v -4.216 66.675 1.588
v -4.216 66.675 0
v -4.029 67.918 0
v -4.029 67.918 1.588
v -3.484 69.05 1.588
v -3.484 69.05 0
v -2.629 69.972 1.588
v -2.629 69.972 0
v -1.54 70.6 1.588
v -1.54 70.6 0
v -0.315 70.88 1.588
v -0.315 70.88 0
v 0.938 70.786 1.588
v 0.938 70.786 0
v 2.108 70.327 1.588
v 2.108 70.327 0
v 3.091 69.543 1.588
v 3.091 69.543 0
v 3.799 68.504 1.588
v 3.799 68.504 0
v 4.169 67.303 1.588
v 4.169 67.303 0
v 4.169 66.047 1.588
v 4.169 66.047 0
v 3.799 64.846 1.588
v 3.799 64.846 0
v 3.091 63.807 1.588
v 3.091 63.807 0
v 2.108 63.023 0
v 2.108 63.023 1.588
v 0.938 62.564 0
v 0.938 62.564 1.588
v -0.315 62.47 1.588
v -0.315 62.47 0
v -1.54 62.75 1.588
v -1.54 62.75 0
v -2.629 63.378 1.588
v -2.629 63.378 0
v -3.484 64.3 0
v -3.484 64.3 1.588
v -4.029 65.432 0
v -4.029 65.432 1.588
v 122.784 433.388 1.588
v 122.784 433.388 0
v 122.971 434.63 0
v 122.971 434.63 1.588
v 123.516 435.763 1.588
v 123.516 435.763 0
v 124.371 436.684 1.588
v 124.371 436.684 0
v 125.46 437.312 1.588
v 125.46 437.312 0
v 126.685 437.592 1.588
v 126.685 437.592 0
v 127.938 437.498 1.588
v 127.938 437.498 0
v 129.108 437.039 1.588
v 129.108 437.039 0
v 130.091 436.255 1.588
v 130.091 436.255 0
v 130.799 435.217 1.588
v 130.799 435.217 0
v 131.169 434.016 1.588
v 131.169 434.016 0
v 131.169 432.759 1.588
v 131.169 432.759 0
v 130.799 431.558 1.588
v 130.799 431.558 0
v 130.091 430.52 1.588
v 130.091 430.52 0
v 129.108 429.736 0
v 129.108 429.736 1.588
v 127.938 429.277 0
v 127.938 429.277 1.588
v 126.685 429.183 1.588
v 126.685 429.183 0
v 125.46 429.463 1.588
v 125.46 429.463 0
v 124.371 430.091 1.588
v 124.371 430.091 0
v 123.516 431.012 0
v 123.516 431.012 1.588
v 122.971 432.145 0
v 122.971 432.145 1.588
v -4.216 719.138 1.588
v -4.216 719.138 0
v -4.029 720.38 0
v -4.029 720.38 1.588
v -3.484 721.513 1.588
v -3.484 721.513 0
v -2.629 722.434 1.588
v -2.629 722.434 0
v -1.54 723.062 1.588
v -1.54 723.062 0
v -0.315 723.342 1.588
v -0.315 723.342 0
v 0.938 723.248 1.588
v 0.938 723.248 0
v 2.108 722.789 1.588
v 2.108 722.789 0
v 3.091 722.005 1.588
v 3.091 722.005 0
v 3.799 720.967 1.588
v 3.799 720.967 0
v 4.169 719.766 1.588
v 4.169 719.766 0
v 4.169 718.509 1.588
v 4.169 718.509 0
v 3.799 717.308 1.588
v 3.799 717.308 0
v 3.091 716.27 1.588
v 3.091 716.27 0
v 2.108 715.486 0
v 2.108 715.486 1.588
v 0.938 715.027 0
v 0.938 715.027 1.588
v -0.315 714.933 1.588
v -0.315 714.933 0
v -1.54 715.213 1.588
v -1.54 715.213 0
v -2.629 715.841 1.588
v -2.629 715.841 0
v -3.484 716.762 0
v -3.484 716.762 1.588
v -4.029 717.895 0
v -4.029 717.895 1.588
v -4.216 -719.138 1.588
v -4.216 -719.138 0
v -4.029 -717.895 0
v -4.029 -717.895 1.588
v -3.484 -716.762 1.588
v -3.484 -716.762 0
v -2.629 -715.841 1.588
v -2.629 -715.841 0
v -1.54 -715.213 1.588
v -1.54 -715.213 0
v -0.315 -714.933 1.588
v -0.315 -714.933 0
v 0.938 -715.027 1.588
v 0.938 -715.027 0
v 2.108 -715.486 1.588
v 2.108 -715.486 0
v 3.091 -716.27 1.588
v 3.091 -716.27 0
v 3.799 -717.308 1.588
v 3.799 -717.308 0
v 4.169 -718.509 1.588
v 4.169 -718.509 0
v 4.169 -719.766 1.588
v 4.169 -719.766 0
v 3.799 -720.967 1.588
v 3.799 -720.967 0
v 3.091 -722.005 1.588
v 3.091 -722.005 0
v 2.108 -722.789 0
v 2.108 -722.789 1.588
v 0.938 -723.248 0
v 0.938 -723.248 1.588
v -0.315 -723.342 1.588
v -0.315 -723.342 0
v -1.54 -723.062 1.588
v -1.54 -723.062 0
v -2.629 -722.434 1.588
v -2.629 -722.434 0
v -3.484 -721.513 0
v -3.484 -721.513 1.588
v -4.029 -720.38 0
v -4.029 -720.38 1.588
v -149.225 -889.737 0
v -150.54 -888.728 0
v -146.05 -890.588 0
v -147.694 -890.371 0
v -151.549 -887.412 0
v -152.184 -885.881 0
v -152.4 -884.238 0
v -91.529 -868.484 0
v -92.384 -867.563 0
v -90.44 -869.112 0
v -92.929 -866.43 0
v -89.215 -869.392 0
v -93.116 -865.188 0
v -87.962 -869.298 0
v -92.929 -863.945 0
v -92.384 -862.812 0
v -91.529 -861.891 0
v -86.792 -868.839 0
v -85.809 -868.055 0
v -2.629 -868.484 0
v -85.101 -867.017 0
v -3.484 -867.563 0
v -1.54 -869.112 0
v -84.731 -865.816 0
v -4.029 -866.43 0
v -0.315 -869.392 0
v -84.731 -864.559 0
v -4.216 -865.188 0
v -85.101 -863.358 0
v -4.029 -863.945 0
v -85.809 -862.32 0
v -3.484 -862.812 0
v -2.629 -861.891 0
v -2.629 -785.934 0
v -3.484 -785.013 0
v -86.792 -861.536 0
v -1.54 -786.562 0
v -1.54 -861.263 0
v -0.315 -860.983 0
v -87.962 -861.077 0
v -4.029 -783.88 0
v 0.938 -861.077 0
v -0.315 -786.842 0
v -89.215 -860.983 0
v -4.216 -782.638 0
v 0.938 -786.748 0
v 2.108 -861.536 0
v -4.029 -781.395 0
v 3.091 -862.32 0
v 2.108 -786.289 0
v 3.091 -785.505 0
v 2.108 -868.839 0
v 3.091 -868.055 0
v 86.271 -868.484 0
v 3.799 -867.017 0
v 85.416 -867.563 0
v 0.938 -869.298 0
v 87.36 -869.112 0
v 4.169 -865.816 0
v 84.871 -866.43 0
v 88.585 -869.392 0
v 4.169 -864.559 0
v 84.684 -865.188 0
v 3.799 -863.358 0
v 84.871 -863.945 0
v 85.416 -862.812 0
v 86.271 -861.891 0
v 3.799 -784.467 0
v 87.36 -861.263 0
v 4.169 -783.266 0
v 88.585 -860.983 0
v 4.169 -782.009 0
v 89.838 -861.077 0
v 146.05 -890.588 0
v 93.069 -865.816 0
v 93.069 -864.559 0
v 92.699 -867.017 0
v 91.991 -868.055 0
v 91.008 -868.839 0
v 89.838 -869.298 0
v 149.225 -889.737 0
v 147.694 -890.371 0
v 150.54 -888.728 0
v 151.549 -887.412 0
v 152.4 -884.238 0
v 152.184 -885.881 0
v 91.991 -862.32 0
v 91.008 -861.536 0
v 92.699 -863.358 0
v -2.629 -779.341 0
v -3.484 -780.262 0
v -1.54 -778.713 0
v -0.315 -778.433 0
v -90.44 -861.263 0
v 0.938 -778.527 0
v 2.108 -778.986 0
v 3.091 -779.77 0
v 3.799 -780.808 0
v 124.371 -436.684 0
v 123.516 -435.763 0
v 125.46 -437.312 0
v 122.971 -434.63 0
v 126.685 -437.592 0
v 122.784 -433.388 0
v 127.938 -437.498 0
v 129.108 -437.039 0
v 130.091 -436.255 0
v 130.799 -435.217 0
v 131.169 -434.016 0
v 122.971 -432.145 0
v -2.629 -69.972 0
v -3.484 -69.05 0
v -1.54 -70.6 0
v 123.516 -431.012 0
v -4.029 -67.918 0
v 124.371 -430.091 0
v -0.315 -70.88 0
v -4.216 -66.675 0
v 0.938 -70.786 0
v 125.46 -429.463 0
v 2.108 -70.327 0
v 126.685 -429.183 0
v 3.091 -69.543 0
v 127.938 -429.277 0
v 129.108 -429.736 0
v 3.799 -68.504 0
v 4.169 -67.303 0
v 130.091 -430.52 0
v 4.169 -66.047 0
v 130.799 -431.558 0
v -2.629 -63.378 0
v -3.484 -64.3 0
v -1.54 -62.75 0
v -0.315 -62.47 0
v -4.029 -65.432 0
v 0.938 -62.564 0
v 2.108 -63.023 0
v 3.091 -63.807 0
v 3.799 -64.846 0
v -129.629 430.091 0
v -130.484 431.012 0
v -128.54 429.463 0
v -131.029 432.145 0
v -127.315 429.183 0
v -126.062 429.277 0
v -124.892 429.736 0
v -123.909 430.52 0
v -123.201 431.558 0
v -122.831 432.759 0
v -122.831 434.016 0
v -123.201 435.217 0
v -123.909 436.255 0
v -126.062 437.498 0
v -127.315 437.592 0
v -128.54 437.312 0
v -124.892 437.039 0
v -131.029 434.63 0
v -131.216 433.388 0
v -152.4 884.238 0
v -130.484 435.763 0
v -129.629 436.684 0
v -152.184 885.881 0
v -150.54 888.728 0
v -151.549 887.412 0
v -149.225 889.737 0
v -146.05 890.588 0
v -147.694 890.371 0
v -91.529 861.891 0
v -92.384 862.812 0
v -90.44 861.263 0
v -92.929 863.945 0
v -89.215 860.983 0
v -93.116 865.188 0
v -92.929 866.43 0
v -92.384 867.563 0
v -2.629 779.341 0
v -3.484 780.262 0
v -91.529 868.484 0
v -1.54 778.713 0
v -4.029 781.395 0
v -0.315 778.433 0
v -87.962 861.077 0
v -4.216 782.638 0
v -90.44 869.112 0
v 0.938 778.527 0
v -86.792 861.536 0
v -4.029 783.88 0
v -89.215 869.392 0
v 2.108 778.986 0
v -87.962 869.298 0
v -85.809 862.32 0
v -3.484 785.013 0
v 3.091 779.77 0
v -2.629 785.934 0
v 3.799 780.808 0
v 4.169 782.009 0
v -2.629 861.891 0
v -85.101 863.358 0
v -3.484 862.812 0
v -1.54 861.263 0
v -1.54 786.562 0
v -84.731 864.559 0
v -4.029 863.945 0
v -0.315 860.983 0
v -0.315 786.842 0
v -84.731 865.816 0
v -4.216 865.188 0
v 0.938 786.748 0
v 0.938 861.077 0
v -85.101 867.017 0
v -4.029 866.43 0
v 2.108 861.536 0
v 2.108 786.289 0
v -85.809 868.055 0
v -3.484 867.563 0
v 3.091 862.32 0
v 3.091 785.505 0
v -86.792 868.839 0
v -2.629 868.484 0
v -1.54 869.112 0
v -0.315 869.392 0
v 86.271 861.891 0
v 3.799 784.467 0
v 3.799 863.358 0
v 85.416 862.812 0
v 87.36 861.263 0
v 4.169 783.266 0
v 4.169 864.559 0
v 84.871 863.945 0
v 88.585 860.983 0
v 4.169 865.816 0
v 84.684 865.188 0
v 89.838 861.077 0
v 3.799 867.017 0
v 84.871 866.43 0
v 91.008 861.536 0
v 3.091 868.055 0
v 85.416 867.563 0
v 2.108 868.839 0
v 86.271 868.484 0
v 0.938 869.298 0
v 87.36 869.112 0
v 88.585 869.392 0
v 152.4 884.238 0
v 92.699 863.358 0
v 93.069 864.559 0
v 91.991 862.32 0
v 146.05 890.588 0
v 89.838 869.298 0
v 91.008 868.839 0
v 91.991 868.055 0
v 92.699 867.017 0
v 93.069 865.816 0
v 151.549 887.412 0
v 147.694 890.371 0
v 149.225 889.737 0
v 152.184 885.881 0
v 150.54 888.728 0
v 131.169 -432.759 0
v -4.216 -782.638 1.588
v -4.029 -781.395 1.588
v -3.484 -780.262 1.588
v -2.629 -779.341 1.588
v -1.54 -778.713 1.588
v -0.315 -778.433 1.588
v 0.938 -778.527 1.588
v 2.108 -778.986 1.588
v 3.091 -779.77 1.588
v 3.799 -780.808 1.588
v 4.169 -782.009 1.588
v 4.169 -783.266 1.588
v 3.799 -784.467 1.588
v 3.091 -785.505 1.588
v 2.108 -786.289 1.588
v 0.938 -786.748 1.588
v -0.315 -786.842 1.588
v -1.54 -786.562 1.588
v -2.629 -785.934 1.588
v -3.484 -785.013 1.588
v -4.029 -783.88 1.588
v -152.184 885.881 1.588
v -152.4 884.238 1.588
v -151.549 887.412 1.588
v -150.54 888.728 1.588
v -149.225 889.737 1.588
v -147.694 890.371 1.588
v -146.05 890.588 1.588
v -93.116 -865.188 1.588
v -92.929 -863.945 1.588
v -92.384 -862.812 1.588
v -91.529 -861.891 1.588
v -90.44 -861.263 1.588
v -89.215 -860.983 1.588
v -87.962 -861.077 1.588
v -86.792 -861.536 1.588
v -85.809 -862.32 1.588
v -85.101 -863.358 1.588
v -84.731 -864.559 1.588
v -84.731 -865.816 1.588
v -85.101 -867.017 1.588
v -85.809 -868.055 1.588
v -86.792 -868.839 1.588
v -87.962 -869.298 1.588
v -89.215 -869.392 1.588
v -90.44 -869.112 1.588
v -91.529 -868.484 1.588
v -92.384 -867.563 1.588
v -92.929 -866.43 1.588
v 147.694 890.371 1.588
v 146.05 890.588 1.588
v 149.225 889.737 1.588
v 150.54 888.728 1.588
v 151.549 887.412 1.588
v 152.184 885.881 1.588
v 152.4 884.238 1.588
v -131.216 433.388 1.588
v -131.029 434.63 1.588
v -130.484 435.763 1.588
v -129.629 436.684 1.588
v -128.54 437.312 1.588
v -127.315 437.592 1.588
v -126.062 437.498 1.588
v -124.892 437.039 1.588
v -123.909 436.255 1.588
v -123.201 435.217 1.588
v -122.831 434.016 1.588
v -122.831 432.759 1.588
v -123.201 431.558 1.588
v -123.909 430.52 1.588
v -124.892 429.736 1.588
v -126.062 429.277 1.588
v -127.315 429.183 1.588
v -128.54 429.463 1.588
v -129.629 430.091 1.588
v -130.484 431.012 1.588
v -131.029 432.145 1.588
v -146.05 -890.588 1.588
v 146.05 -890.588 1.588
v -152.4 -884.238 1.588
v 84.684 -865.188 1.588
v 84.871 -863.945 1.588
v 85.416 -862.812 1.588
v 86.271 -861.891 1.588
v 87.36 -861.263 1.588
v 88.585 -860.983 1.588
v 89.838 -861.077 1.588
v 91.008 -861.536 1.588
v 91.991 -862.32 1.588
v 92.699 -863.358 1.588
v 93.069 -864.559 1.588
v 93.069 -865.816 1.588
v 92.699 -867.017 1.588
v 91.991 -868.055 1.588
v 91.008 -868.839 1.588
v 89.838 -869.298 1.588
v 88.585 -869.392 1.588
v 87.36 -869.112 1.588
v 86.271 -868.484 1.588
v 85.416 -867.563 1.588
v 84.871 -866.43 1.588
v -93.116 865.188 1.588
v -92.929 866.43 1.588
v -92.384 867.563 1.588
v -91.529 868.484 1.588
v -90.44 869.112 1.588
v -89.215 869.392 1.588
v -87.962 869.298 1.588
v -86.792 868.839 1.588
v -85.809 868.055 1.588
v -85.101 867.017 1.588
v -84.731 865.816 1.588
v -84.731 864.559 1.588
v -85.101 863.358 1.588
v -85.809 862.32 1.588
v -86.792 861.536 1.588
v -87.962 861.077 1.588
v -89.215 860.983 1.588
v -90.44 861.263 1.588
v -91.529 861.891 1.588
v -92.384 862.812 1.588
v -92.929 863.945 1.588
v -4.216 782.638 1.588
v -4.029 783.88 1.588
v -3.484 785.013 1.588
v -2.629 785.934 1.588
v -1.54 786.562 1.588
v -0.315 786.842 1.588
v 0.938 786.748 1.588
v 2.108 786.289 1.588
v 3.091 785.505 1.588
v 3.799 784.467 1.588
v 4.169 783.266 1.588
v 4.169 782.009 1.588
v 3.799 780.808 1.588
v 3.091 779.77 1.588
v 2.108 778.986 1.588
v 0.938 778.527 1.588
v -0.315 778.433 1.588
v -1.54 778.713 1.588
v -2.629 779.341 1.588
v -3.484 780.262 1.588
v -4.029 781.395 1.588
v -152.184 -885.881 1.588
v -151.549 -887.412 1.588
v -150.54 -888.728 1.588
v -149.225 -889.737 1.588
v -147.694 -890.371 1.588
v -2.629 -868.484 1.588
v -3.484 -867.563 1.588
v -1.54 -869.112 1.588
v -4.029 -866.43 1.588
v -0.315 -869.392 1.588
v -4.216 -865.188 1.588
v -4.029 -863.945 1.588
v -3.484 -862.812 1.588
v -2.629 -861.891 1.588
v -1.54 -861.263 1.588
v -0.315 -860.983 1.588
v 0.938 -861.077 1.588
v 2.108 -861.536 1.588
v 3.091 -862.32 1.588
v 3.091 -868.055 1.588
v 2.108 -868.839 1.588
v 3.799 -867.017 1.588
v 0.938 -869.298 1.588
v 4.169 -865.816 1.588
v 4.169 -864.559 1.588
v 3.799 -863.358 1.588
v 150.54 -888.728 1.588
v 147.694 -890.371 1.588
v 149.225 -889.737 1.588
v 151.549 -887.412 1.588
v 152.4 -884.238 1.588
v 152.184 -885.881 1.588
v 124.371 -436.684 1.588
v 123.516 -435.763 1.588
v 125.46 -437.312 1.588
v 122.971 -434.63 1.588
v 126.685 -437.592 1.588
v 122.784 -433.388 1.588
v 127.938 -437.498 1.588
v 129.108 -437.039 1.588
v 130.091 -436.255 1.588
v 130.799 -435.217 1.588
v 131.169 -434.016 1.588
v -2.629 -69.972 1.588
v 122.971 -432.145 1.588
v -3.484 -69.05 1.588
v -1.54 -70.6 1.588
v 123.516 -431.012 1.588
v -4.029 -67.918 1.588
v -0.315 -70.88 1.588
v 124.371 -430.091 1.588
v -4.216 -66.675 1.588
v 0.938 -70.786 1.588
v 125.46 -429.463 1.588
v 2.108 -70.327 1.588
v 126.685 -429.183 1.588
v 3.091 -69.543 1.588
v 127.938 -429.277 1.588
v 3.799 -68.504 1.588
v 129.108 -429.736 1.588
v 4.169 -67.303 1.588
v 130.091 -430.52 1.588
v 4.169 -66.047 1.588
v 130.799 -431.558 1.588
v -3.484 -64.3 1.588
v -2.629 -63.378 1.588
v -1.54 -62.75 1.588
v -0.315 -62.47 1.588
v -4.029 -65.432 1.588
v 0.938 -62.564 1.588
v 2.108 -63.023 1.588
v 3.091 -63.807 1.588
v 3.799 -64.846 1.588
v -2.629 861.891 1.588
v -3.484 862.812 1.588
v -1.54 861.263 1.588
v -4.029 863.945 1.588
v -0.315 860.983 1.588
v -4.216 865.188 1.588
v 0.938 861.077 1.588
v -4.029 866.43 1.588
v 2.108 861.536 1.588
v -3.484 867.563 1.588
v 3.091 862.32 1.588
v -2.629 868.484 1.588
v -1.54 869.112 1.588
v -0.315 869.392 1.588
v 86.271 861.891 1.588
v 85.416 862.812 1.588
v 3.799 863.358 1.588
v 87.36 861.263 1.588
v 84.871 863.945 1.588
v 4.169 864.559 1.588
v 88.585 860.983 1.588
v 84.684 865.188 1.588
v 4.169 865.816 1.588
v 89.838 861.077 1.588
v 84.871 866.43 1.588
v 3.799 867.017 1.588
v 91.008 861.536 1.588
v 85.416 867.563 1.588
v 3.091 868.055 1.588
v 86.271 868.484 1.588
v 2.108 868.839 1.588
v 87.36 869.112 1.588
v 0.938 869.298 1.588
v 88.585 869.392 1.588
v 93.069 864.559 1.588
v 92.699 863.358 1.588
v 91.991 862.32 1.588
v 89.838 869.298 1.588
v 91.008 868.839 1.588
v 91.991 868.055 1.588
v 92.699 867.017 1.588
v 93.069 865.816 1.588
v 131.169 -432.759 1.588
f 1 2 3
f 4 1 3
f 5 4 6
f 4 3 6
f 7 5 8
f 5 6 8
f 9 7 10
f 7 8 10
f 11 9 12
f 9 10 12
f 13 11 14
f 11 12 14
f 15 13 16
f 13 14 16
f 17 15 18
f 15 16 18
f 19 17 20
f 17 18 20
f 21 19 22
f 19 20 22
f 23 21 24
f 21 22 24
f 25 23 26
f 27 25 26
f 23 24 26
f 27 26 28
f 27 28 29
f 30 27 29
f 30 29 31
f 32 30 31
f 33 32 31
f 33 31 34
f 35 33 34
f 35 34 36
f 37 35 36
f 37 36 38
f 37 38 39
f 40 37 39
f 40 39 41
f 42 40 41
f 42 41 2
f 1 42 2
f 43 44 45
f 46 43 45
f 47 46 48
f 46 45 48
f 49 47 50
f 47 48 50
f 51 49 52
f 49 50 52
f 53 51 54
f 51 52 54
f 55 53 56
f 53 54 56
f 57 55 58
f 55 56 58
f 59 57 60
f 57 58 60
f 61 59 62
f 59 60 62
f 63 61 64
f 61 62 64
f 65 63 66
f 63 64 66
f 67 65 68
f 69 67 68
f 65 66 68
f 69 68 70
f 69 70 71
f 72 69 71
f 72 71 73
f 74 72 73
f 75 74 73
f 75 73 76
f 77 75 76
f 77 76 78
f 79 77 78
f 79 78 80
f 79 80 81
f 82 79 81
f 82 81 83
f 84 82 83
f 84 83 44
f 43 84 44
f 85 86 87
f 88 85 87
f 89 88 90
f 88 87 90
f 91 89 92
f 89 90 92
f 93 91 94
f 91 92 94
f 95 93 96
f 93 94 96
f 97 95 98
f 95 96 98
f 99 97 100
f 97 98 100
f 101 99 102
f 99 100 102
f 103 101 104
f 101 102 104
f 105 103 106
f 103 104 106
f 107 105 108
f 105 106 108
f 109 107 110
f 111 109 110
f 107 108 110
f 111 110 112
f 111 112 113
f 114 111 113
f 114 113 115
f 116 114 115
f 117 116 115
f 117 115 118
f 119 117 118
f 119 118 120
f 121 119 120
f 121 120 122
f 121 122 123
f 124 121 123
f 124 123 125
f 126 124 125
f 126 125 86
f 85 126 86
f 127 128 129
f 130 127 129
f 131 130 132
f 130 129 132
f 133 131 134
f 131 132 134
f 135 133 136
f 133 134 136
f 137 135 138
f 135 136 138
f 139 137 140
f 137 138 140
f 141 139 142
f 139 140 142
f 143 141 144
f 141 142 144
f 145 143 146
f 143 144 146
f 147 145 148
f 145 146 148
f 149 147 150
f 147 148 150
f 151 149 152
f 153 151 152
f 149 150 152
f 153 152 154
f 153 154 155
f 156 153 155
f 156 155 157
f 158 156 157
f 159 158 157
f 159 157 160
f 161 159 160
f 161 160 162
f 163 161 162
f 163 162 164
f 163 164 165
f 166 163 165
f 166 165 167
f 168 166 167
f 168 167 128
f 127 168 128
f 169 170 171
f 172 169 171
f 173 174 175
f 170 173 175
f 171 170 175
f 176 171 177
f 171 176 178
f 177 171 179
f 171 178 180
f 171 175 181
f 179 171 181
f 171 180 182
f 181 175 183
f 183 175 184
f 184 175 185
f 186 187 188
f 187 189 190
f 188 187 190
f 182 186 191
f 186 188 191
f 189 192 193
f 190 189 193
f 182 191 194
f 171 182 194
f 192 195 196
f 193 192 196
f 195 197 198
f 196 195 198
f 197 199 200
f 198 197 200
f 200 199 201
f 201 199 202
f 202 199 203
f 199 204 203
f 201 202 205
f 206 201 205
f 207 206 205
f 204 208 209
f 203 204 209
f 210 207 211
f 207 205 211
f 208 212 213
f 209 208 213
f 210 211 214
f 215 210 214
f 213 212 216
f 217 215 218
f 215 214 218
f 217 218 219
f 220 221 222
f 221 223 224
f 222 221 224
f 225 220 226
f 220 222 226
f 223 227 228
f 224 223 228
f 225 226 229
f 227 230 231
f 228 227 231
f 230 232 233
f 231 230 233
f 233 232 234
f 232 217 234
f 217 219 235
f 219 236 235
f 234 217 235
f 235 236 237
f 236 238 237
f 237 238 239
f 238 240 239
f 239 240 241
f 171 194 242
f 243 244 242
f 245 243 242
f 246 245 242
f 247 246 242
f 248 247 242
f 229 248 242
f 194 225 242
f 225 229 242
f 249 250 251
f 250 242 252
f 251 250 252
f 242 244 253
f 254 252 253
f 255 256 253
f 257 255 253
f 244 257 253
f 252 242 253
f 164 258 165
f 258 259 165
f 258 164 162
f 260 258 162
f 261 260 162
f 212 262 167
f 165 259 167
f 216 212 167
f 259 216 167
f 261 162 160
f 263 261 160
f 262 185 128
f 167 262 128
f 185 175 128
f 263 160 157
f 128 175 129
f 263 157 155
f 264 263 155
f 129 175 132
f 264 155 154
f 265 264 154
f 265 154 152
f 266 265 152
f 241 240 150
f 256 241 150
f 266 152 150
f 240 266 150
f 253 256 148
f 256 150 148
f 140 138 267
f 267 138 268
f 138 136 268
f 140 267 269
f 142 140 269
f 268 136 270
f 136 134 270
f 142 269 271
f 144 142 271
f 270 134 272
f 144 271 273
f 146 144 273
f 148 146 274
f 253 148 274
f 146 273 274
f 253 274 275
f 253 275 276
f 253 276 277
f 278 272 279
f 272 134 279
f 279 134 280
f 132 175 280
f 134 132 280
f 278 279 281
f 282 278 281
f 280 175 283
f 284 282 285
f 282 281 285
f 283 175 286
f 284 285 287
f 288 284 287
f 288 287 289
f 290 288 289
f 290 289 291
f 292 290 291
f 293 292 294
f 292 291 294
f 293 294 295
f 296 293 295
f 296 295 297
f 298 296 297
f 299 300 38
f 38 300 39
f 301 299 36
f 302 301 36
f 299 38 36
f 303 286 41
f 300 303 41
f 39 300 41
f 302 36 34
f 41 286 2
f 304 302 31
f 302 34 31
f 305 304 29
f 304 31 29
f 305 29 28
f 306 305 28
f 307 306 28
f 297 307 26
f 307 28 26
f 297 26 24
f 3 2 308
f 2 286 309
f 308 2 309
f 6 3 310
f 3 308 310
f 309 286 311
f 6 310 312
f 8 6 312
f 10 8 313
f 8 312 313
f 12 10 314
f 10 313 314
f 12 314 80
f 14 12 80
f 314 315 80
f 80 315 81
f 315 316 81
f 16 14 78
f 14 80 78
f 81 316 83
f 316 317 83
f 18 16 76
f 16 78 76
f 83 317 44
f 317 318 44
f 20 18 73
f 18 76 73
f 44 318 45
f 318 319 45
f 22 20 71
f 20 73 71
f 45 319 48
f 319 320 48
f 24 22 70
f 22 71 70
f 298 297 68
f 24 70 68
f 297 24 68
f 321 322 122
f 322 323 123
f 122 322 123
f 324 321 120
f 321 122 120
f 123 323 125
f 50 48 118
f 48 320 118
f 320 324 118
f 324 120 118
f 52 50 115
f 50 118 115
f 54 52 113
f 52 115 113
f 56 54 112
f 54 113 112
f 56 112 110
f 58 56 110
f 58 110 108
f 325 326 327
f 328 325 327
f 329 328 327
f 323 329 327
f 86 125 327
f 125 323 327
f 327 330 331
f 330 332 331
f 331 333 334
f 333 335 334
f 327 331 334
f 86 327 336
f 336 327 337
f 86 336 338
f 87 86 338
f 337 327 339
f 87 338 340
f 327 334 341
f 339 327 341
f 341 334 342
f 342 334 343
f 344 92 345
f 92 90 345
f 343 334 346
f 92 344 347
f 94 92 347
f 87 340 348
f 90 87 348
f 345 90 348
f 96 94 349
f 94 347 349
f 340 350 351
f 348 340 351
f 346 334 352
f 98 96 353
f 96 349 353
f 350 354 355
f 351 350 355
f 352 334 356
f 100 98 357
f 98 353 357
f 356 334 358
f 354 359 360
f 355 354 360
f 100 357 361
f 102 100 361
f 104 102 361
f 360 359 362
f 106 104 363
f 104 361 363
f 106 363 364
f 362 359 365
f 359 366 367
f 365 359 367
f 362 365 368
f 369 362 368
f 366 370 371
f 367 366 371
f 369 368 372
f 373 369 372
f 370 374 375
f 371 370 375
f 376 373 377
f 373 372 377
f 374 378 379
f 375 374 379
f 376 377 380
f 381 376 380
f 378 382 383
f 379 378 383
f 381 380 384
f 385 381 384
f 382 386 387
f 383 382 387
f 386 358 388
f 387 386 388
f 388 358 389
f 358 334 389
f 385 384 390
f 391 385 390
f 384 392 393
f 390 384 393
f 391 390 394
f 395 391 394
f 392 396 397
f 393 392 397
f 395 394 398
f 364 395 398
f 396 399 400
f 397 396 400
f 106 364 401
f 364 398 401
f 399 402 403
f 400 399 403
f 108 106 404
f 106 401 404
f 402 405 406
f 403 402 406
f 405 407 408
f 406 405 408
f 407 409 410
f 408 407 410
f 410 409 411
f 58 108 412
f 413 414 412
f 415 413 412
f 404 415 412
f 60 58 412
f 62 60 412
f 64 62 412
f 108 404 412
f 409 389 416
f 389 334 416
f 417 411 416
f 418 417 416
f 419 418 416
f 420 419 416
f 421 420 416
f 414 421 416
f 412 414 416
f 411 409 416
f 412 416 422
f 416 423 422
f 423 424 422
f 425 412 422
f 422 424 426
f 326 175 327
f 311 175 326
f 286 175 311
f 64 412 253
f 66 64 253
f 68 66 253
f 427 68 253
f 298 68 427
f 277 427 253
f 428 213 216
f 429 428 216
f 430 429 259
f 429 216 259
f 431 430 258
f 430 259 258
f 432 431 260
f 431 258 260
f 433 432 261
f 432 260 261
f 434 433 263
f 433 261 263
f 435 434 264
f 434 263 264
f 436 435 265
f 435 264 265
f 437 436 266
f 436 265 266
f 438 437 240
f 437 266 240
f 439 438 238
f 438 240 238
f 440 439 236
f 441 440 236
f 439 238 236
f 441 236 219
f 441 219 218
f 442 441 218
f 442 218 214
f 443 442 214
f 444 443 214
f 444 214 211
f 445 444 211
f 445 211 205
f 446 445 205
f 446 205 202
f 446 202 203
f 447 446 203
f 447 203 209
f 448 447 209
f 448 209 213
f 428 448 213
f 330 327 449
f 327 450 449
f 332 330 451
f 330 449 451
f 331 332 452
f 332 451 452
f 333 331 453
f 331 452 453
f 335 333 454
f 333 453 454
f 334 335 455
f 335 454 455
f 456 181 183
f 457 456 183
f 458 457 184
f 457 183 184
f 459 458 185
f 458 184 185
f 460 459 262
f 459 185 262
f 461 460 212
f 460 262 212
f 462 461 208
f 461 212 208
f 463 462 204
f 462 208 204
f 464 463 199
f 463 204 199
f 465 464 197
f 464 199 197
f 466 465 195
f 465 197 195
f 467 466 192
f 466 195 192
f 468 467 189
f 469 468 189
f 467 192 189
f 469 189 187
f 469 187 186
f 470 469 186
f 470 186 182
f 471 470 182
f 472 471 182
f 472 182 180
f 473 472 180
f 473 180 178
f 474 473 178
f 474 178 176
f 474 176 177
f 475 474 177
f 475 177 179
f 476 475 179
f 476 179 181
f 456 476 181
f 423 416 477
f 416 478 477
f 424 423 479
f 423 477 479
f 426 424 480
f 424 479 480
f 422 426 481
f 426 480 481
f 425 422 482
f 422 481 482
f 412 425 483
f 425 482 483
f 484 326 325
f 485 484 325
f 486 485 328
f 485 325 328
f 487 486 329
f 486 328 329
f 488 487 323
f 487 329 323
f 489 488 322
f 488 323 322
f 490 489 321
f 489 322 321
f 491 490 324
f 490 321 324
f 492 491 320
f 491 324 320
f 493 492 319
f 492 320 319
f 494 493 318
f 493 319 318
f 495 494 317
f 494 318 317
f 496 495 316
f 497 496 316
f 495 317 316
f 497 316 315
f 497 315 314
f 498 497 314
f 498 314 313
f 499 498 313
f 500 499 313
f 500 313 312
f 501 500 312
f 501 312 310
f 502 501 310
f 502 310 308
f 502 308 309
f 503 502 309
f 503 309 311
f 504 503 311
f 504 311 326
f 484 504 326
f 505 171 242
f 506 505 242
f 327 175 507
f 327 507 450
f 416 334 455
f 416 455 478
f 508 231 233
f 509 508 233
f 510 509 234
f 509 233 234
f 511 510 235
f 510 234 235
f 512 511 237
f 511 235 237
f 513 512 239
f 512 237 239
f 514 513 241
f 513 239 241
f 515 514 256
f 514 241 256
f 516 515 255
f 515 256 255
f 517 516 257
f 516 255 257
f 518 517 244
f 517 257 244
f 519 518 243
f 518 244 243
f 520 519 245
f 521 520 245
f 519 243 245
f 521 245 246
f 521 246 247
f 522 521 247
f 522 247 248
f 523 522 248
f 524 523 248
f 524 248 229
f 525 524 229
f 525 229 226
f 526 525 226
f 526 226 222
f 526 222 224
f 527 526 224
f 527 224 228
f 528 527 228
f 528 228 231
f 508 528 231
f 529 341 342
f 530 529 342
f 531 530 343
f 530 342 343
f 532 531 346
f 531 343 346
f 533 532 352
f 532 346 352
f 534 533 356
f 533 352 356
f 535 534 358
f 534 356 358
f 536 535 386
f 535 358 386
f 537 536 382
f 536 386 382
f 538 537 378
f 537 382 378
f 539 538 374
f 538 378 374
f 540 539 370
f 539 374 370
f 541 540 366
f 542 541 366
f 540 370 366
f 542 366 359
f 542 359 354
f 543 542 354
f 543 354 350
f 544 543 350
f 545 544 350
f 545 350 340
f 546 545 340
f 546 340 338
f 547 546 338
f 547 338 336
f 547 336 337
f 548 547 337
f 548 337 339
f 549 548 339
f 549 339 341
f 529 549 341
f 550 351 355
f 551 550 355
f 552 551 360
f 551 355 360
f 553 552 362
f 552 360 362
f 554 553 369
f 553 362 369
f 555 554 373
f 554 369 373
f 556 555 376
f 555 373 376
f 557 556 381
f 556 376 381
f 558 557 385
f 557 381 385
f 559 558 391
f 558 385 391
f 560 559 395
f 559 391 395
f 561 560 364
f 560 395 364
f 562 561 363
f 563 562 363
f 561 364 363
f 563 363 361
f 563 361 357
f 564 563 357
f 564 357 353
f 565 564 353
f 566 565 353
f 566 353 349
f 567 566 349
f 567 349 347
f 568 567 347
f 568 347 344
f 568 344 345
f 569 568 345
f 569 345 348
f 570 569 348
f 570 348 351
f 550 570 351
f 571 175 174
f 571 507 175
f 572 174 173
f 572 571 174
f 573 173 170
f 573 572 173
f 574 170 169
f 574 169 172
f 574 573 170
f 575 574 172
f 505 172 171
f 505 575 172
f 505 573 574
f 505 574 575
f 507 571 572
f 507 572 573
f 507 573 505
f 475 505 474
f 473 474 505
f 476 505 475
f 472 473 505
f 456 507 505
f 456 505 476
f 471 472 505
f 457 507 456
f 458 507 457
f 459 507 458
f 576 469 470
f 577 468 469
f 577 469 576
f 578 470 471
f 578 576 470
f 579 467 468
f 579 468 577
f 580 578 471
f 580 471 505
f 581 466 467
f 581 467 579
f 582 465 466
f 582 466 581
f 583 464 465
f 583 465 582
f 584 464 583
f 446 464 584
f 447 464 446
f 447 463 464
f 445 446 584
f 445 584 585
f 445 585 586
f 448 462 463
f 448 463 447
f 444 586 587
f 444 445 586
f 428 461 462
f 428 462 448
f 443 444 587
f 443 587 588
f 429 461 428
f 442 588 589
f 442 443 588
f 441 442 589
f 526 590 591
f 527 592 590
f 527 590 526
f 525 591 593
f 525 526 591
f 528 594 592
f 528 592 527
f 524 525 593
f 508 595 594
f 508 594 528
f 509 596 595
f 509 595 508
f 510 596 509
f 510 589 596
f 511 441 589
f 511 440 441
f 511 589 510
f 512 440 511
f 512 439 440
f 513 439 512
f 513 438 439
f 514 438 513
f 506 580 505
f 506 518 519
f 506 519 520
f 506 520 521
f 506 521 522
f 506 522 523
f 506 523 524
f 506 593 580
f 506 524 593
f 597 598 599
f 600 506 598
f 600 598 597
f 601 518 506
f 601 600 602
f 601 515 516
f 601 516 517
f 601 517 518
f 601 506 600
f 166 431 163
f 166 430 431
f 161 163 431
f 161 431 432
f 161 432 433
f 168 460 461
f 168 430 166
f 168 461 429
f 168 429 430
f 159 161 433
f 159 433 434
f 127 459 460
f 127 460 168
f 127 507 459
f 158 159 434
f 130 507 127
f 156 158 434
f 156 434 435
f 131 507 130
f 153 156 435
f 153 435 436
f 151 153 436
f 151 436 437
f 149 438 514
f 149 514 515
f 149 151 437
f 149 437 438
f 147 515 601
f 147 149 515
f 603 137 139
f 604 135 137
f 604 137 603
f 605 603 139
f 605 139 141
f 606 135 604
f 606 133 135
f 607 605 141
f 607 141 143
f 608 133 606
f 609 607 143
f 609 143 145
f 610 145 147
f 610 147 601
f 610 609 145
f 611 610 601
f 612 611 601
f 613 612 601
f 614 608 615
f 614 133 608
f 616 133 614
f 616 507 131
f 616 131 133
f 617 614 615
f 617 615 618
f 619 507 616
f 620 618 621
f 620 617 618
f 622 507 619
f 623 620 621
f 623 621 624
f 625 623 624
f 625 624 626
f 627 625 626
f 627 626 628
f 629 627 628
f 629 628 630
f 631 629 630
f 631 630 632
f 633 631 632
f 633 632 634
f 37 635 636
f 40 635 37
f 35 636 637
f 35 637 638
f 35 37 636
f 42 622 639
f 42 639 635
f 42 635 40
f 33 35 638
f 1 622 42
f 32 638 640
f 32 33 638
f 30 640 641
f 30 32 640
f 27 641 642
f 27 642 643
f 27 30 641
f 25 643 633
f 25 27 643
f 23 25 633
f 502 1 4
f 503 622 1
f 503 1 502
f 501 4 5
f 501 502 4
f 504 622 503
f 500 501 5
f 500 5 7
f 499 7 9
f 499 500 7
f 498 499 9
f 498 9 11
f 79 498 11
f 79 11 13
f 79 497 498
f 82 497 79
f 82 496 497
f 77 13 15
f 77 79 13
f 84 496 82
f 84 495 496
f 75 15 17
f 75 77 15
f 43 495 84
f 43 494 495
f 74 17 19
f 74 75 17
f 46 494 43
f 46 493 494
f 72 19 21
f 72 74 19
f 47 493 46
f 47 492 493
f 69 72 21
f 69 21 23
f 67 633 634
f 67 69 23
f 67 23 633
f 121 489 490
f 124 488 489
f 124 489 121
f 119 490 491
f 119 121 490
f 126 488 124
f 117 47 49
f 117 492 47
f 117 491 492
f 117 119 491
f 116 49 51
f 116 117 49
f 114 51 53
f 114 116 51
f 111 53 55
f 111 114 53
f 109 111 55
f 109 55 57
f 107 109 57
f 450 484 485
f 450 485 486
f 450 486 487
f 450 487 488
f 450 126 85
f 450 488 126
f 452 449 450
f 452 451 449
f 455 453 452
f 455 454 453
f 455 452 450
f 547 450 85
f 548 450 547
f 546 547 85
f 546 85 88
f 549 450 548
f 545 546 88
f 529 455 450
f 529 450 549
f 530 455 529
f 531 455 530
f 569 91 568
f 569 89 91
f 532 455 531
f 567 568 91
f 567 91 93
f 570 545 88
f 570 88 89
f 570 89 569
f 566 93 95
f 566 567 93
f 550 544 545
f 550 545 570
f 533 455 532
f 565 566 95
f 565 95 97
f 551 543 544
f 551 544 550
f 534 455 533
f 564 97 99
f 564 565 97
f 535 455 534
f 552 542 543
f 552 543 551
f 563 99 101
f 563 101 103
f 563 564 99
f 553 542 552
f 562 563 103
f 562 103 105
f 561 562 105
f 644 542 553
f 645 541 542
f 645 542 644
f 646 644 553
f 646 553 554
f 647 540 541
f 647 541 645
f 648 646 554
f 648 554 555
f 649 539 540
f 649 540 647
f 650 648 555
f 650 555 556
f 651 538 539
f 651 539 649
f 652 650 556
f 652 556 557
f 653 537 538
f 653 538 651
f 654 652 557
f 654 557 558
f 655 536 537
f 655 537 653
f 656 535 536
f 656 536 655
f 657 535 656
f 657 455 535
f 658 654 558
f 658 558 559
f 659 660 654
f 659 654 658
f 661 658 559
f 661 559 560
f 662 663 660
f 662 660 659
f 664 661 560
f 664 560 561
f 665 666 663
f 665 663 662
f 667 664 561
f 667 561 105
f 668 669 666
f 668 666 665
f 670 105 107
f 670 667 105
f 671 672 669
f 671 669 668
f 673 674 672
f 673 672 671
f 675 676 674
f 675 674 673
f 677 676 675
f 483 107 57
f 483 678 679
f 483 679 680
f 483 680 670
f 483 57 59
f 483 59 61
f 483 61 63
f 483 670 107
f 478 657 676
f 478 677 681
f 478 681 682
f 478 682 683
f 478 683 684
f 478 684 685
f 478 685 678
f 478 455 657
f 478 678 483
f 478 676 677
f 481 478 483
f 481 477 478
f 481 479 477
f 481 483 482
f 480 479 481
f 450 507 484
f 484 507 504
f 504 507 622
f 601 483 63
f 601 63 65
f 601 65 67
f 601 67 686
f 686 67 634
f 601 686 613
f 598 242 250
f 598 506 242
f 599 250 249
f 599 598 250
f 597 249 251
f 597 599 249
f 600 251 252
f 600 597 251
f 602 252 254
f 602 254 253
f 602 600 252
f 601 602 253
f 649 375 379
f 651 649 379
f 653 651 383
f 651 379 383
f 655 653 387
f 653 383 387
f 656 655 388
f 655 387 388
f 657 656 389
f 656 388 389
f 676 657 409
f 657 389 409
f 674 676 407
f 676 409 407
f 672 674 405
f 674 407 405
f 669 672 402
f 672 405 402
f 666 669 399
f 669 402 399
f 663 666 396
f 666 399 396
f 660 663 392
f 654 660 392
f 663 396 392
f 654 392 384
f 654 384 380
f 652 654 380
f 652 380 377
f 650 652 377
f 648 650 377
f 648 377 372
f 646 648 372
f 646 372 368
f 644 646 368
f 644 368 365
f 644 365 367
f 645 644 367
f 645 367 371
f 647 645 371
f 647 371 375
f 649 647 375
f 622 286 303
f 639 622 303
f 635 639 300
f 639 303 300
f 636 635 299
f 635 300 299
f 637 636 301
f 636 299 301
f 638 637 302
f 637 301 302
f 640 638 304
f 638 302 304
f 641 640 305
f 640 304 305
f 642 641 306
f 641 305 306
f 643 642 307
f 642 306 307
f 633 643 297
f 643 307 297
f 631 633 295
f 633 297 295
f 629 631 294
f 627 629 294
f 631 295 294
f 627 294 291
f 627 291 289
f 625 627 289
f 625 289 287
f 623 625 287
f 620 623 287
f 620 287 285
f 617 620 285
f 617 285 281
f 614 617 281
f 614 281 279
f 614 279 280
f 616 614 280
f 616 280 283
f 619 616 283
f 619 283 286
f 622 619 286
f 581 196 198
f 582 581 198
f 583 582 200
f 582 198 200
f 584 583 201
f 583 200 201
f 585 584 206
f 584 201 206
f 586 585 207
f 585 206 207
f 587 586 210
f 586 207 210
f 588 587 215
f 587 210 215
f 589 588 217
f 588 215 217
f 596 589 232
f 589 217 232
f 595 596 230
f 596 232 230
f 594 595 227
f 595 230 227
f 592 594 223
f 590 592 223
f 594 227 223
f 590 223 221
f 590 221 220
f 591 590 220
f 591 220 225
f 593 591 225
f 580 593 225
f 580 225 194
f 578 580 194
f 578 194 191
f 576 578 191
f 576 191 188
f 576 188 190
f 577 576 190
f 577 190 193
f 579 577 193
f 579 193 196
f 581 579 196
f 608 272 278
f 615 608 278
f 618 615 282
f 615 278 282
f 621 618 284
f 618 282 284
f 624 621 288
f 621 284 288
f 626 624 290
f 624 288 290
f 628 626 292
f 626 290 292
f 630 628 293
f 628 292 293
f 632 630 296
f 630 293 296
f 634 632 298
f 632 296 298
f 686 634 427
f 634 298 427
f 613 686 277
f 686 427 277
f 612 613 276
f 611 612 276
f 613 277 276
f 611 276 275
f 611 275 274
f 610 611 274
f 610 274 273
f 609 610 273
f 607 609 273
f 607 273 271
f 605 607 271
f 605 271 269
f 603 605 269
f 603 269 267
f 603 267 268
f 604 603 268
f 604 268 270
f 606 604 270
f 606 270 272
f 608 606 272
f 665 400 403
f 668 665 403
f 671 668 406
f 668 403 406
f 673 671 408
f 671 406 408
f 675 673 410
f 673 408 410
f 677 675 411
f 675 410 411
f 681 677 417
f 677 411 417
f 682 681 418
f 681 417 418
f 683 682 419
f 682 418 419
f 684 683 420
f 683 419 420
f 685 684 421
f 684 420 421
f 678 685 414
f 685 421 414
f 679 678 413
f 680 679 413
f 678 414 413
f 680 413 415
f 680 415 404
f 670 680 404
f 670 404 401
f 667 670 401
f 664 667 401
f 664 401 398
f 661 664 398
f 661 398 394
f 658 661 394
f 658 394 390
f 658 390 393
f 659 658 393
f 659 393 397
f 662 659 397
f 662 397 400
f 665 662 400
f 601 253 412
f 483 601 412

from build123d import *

# Parameters (mm, degrees)
SKETCH1_W                    = 304.8
SKETCH1_H                    = 1781.175
BOSS_EXTRUDE1_DEPTH          = 1.5875
F_5_16_CLEARANCE_HOLE1_D     = 8.4328
F_5_16_CLEARANCE_HOLE1_DEPTH = 1.5875
FILLET4_R                    = 6.35


with BuildPart() as part:
    # Sketch1 → Boss-Extrude1 (new body)
    with BuildSketch(Plane.XY):
        Rectangle(SKETCH1_W, SKETCH1_H)
    extrude(amount=BOSS_EXTRUDE1_DEPTH)

    # 5/16 Clearance Hole1
    with Locations(Plane.XY.offset(1.5875)):
        with Locations((0, 865.1875), (-127, 433.3875), (127, 433.3875), (0, 66.675), (0, -66.675), (127, -433.3875), (0, -865.1875), (0, 782.6375), (0, 719.1375), (0, -782.6375), (0, -719.1375), (-88.9, 865.1875), (88.9, 865.1875), (-88.9, -865.1875), (88.9, -865.1875)):
            Hole(F_5_16_CLEARANCE_HOLE1_D / 2, depth=F_5_16_CLEARANCE_HOLE1_DEPTH)

    # Fillet4
    fillet4_edges = [part.edges().sort_by_distance(p)[0] for p in [
        (152.4, -890.5875, 0.79375),
        (-152.4, -890.5875, 0.79375),
        (-152.4, 890.5875, 0.79375),
        (152.4, 890.5875, 0.79375),
    ]]
    fillet(fillet4_edges, radius=FILLET4_R)


solid = part.part
